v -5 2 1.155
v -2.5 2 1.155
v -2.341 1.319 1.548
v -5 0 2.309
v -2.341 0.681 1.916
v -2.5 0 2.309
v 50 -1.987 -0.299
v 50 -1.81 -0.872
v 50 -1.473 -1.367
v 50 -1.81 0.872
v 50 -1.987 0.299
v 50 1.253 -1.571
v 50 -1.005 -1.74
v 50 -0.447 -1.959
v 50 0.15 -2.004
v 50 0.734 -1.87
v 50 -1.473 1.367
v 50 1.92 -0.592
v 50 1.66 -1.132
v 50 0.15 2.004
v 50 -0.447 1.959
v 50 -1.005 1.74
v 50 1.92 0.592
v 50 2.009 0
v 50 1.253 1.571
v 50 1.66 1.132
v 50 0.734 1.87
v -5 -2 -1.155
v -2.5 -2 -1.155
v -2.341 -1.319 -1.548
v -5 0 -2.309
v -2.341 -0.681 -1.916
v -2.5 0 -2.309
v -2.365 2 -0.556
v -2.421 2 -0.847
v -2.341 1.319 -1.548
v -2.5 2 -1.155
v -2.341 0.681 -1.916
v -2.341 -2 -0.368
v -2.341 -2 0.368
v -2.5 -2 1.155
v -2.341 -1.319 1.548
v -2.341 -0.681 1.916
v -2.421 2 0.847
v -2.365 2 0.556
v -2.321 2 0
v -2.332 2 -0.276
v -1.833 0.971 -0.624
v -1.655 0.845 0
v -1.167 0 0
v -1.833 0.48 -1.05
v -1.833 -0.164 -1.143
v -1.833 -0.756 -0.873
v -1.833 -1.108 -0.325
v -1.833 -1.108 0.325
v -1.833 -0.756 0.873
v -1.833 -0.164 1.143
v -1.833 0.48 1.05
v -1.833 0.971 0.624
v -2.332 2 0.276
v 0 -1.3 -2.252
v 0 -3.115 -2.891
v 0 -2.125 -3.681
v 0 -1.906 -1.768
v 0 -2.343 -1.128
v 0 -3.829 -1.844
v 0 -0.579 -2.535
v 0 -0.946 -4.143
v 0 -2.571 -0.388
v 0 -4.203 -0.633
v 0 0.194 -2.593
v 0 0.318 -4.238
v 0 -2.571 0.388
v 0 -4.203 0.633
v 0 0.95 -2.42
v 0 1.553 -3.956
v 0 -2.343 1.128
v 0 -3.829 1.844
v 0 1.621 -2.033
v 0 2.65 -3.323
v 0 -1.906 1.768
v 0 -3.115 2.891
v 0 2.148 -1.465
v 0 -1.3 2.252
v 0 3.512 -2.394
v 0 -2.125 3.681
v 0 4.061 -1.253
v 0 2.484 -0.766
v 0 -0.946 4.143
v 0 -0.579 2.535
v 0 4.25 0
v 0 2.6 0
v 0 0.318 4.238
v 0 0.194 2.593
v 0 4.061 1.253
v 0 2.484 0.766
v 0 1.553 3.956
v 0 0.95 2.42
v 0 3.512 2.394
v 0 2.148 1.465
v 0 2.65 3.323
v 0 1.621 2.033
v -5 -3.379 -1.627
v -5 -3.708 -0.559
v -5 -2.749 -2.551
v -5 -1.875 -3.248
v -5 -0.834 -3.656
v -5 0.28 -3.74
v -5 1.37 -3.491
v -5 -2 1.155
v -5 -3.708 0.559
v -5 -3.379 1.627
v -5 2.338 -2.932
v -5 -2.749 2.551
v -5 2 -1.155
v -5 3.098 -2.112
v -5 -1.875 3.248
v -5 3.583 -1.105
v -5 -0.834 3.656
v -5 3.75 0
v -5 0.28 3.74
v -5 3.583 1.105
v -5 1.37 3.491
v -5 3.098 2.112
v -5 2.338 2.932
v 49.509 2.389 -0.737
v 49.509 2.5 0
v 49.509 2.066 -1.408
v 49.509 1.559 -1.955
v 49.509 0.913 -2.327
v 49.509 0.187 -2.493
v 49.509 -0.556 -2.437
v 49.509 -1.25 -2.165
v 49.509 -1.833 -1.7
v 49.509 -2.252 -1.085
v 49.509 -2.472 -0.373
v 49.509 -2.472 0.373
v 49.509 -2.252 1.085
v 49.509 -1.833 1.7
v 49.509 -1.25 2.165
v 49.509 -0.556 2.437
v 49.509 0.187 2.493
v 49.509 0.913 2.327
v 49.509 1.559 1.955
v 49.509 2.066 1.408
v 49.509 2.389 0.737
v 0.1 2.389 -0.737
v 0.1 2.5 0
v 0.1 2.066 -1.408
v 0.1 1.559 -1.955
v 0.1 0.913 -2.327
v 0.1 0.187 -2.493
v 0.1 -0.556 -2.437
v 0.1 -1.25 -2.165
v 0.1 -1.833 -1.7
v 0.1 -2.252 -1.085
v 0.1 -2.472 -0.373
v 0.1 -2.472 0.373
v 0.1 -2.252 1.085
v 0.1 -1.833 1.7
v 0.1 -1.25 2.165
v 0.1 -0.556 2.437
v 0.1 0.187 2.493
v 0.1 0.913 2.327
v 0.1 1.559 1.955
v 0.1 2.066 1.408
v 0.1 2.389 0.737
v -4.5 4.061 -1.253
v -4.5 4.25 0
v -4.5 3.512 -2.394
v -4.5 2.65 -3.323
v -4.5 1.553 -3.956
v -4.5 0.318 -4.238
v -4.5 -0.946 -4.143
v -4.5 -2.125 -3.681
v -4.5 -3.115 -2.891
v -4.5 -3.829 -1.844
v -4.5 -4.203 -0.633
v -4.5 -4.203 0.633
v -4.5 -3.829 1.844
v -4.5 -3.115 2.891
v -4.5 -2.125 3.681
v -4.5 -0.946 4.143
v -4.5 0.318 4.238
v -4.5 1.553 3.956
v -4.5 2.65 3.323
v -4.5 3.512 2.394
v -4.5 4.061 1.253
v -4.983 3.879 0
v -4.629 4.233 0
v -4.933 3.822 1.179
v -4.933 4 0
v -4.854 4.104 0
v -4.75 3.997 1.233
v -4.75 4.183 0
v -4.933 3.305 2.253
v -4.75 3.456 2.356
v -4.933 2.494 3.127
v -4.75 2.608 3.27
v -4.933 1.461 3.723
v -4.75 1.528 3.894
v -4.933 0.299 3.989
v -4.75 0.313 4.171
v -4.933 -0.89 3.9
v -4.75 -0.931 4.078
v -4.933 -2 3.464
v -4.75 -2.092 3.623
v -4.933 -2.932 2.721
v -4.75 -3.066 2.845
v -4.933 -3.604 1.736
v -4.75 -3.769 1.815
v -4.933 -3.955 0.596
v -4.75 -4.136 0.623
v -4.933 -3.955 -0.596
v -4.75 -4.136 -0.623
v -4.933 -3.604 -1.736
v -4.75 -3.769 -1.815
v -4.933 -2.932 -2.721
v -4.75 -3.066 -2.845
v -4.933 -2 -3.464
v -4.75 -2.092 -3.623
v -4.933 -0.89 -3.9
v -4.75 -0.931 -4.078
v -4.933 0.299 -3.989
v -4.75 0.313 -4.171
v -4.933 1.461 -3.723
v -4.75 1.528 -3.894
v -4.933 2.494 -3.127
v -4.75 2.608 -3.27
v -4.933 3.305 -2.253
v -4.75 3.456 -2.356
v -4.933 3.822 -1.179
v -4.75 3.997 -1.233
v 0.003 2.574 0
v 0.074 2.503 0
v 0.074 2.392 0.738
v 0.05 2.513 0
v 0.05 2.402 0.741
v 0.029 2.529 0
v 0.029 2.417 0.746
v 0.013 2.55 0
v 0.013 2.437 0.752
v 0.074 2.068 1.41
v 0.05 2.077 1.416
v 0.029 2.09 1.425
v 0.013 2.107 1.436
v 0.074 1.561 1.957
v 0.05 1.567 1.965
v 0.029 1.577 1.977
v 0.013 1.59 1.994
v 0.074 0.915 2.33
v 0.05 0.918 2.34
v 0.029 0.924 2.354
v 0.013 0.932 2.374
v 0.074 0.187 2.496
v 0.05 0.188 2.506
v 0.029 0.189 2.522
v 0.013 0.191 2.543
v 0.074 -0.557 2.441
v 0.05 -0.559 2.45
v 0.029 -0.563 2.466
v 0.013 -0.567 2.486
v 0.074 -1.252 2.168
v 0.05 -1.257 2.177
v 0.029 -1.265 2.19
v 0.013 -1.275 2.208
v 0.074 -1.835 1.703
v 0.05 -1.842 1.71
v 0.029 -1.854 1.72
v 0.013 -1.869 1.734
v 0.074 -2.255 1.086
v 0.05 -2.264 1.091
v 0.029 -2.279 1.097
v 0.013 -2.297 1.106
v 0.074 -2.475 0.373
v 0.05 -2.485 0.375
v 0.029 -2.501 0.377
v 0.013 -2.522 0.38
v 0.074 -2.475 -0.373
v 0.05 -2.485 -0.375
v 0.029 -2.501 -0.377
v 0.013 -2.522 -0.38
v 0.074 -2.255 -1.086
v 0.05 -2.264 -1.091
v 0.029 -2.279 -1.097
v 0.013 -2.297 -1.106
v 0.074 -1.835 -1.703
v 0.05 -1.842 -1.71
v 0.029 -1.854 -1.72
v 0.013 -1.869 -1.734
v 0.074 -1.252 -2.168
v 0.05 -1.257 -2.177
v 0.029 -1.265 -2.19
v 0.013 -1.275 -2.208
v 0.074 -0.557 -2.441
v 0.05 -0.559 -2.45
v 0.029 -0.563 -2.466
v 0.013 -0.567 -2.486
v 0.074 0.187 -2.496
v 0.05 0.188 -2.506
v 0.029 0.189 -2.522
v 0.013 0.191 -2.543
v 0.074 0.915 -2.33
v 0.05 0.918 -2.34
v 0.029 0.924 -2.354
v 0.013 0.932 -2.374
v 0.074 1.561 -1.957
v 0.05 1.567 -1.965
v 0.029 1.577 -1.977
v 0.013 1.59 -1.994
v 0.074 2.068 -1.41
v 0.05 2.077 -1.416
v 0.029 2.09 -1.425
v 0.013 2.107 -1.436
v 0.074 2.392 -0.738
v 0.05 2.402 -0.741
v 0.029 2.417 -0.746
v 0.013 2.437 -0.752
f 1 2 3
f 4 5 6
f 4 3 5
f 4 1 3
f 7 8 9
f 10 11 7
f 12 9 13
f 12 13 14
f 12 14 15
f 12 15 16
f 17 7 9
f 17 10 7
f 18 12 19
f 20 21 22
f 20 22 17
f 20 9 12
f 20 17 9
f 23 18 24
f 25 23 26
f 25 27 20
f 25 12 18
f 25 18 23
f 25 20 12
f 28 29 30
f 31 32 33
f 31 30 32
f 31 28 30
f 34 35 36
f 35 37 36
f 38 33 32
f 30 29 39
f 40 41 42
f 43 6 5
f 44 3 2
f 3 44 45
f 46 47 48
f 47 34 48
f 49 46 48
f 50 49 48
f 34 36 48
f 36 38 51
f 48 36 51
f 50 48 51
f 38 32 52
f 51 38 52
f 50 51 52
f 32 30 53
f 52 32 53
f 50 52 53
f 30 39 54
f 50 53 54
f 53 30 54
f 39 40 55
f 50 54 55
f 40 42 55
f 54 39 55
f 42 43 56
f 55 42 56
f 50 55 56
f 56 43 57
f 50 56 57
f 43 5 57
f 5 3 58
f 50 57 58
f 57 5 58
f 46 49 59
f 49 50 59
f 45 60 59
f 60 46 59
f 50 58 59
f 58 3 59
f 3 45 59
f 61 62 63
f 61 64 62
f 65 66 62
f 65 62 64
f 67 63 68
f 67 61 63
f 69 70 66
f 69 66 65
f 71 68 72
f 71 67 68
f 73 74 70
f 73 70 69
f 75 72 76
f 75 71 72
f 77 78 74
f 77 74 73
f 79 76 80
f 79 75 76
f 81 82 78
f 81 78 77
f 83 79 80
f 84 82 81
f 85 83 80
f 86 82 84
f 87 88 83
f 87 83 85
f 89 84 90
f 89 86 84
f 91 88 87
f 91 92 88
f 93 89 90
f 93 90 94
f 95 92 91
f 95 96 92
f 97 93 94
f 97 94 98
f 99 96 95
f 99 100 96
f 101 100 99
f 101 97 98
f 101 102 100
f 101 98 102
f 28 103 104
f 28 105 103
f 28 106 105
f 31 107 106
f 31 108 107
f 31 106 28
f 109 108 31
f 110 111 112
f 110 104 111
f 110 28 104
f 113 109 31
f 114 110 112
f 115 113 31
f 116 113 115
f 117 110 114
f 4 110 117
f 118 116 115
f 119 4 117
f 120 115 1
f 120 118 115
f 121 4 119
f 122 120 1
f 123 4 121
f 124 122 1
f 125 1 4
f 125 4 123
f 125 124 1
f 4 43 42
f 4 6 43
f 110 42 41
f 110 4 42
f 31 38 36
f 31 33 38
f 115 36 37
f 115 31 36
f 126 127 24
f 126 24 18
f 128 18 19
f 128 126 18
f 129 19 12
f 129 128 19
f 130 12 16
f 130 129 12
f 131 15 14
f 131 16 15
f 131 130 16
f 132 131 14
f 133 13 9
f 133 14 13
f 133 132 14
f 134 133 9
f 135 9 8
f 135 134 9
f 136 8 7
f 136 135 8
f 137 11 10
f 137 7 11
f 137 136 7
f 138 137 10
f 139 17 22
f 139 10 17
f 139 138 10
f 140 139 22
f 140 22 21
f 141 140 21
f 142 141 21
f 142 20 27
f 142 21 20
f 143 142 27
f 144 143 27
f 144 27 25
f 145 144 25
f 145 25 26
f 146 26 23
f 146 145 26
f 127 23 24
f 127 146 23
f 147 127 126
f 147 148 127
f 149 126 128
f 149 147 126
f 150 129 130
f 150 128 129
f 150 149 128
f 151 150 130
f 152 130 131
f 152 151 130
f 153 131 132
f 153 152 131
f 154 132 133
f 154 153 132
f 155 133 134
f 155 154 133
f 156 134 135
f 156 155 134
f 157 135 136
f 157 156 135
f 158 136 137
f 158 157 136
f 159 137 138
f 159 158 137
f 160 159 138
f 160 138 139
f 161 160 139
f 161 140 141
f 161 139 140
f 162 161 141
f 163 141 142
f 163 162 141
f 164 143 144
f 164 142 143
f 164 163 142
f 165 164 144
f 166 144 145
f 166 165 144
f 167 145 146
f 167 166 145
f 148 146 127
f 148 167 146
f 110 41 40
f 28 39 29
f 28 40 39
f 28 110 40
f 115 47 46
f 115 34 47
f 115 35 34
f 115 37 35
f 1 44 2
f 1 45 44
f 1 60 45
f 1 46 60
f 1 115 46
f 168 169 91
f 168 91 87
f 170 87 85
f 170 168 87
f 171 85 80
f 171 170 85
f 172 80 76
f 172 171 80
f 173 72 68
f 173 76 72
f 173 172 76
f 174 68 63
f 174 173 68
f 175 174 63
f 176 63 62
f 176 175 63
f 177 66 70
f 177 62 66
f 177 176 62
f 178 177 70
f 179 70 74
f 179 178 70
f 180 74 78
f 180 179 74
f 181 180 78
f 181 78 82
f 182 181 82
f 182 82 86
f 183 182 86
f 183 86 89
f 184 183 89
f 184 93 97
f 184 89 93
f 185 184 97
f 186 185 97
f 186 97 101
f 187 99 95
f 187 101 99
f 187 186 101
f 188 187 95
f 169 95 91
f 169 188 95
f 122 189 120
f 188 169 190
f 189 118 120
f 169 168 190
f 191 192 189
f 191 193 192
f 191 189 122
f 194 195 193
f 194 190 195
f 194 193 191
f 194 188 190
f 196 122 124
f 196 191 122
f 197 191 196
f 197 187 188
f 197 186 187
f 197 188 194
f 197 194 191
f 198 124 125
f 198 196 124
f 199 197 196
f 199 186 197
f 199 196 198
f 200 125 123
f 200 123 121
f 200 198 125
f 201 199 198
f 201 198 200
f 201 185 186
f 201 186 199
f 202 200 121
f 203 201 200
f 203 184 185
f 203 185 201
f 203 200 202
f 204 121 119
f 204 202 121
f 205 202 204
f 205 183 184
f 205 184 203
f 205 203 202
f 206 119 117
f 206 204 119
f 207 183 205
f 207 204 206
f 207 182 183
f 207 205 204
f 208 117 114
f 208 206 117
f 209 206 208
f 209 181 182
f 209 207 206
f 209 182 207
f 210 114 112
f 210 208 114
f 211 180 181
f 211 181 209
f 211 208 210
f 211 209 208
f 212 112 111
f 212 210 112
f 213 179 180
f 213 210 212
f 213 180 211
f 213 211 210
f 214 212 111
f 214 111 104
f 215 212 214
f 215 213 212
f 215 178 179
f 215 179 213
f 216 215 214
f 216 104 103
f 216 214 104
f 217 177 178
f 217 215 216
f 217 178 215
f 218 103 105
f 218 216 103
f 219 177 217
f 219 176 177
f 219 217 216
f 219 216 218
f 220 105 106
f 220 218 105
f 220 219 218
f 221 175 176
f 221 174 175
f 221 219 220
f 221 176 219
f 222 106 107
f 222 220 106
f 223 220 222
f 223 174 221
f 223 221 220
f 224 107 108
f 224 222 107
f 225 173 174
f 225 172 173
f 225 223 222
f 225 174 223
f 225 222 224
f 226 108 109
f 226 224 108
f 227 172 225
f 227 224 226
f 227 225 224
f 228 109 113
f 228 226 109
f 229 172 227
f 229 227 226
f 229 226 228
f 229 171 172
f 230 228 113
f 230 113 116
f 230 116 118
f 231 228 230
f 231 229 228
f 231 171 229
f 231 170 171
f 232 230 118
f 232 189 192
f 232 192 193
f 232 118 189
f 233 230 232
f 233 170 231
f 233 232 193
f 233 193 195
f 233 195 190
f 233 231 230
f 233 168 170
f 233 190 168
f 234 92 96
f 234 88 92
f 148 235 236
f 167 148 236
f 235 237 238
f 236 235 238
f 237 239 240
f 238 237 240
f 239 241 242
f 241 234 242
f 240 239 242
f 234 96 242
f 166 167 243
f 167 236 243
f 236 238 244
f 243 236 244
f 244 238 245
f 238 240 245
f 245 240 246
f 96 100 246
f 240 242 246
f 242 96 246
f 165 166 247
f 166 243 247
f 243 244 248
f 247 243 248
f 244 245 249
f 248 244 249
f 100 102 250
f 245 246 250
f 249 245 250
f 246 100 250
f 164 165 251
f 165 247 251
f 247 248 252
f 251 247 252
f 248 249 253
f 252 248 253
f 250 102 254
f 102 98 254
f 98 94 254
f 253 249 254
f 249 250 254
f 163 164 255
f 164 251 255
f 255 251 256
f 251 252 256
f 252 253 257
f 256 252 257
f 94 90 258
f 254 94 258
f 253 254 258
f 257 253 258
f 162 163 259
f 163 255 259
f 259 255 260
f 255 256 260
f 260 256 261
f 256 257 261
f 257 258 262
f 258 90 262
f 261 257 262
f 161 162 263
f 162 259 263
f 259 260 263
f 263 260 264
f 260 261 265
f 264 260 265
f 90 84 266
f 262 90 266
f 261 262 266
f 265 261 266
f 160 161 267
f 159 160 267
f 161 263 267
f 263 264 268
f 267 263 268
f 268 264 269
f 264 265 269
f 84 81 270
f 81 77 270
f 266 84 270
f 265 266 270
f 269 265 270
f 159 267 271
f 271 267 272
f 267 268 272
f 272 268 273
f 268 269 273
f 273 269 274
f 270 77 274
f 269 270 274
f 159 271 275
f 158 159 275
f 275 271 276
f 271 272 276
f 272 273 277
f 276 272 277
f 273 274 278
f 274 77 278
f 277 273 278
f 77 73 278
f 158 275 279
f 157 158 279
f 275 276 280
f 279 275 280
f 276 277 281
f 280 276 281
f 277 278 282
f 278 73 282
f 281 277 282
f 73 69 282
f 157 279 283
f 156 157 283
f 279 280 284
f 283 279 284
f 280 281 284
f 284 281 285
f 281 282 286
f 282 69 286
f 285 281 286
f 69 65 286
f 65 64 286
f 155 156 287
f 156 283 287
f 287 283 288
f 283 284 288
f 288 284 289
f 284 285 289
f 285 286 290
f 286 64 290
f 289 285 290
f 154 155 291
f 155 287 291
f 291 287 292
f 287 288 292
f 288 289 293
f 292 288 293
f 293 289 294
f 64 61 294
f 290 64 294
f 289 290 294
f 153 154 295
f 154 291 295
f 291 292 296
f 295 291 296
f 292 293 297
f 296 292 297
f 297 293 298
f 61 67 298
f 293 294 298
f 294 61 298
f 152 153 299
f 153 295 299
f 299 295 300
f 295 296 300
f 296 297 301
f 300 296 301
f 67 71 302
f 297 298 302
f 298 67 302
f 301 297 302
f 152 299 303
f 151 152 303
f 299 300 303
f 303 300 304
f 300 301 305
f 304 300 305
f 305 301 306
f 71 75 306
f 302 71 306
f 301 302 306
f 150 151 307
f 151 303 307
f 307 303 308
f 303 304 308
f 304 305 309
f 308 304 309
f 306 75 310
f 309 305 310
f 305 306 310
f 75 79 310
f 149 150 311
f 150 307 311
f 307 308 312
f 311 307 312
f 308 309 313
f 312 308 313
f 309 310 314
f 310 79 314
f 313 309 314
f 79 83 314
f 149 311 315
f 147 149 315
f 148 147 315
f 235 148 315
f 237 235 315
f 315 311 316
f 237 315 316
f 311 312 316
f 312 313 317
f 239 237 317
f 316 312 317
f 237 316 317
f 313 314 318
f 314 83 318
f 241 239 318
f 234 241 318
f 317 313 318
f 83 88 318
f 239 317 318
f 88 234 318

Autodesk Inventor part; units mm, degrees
ref_plane "YZ Plane" through (0, 0, 0) normal (1, 0, 0) x (0, 1, 0)
ref_plane "XZ Plane" through (0, 0, 0) normal (0, 1, 0) x (-1, 0, 0)
sketch "Szkic1" plane through (0, 0, 0) normal (0, 0, 1) x (1, 0, 0)
  line L0 (-1.1667, 0) -> (50, 0)
  line L1 (50, 0) -> (50, 2.5)
  line L2 (50, 2.5) -> (28, 2.5)
  line L3 (28, 2.5) -> (27.5091, 2.5)
  line L4 (27.5091, 2.5) -> (0, 2.5)
  line L5 (0, 2.5) -> (0, 4.25)
  line L6 (0, 4.25) -> (-5, 4.25)
  line L7 (-5, 4.25) -> (-5, 2.3094)
  line L8 (-5, 2.3094) -> (-2.5, 2.3094)
  line L9 (-2.5, 2.3094) -> (-1.1667, 0)
  line L10 (-16, 0) -> (61, 0) projected
  line L11 (0, -0.85) -> (0, 5.1) projected
  line L12 (28, 2.5) -> (0, 2.5) construction
  dimension "d1" = 22
  dimension "d2" = 0.4909
  dimension "d3" = 5
  dimension "d4" = 2.5
  dimension "d5" = 60
  dimension "d6" = 5
  dimension "d7" = 5
  dimension "d8" = 4.6188
  dimension "d9" = 8.5
  dimension "d26" = 50
revolve "Bryła" add sketch "Szkic1" angle 360 about axis through (-1.1667, 0, 0) along (1, 0, 0)
sketch "Szkic2" plane through (-5, 0, 0) normal (-1, 0, 0) x (0, 0, 1)
  circle A0 centre (0, 0) radius 2.3094 projected
  line L0 (0, -5.95) -> (0, 5.95) projected
  line L1 (-5.95, 0) -> (5.95, 0) projected
  line L2 (2.3094, 0) -> (1.1547, -2)
  line L3 (1.1547, -2) -> (-1.1547, -2)
  line L4 (-1.1547, -2) -> (-2.3094, 0)
  line L5 (-2.3094, 0) -> (-1.1547, 2)
  line L6 (-1.1547, 2) -> (1.1547, 2)
  line L7 (1.1547, 2) -> (2.3094, 0)
extrude "Szczelina" add sketch "Szkic2" against normal up to next contours L7 A0 | A0 L2 | L6 L0 A0 | A0 L0 L3 | L0 L6 A0 | A0 L3 L0 | L4 A0 | A0 L5
fillet "Zaokrąglenie1" radius 0.5 1 edges at (-5, -4.25, 0)
thread "Gwint" size "M5x0.8" class "6g" standard "ISO Metric profile" length 22
chamfer "Faza1" distance 0.4908 distance2 0.4908 1 edges at (50, -2.5, 0) measured on face at (50, -0.1004, 0.8273)
ref_plane "Work Plane1" through (29, 0, 0) normal (0, -1, 0) x (1, 0, 0)
fillet "Fillet2" radius 0.1 1 edges at (0, -2.5, 0)
equation "\"d1\" = GEL"
equation "\"d3\" = KOH"
equation "\"d4\" = INTI"
equation "\"d6\" = GD"
equation "\"d7\" = BDM"
equation "\"d8\" = 1.1547 * SW"
equation "\"d9\" = KOD"
equation "\"d26\" = NLG"
equation "\"d30\" = R"
equation "\"d17\" = RR"
equation "\"d13\" = GEL"
equation "\"d15\" = -0.5 * SPD + 0.5 * GD"
equation "\"d16\" = GUL"
equation "\"GD\" = 5"
equation "\"NLG\" = 50"
equation "\"GEL\" = 22"
equation "\"KOD\" = 8.5"
equation "\"KOH\" = 5"
equation "\"INTI\" = 2.5"
equation "\"GAL\" = 0.61345 * PTC"
equation "\"GUL\" = 0.61345 * PTC"
equation "\"BDM\" = NND"
equation "\"SW\" = 4"
equation "\"RR\" = 0.5"
equation "\"SPD\" = NND - 1.2269 * PTC"
equation "\"R\" = 0.1"
equation "\"TOA\" = 30deg"
equation "\"GD1\" = THREADDIA - 1.2269 * PTC"
equation "\"THREADDIA\" = 5"
equation "\"FAWI\" = 45deg"
equation "\"PTC\" = 0.8"
equation "\"NND\" = 5"
equation "\"E0\" = 1.155 * SW"
properties part number "ISO 4762  - M5 x 50" material "Stal nierdzewna 440C"
